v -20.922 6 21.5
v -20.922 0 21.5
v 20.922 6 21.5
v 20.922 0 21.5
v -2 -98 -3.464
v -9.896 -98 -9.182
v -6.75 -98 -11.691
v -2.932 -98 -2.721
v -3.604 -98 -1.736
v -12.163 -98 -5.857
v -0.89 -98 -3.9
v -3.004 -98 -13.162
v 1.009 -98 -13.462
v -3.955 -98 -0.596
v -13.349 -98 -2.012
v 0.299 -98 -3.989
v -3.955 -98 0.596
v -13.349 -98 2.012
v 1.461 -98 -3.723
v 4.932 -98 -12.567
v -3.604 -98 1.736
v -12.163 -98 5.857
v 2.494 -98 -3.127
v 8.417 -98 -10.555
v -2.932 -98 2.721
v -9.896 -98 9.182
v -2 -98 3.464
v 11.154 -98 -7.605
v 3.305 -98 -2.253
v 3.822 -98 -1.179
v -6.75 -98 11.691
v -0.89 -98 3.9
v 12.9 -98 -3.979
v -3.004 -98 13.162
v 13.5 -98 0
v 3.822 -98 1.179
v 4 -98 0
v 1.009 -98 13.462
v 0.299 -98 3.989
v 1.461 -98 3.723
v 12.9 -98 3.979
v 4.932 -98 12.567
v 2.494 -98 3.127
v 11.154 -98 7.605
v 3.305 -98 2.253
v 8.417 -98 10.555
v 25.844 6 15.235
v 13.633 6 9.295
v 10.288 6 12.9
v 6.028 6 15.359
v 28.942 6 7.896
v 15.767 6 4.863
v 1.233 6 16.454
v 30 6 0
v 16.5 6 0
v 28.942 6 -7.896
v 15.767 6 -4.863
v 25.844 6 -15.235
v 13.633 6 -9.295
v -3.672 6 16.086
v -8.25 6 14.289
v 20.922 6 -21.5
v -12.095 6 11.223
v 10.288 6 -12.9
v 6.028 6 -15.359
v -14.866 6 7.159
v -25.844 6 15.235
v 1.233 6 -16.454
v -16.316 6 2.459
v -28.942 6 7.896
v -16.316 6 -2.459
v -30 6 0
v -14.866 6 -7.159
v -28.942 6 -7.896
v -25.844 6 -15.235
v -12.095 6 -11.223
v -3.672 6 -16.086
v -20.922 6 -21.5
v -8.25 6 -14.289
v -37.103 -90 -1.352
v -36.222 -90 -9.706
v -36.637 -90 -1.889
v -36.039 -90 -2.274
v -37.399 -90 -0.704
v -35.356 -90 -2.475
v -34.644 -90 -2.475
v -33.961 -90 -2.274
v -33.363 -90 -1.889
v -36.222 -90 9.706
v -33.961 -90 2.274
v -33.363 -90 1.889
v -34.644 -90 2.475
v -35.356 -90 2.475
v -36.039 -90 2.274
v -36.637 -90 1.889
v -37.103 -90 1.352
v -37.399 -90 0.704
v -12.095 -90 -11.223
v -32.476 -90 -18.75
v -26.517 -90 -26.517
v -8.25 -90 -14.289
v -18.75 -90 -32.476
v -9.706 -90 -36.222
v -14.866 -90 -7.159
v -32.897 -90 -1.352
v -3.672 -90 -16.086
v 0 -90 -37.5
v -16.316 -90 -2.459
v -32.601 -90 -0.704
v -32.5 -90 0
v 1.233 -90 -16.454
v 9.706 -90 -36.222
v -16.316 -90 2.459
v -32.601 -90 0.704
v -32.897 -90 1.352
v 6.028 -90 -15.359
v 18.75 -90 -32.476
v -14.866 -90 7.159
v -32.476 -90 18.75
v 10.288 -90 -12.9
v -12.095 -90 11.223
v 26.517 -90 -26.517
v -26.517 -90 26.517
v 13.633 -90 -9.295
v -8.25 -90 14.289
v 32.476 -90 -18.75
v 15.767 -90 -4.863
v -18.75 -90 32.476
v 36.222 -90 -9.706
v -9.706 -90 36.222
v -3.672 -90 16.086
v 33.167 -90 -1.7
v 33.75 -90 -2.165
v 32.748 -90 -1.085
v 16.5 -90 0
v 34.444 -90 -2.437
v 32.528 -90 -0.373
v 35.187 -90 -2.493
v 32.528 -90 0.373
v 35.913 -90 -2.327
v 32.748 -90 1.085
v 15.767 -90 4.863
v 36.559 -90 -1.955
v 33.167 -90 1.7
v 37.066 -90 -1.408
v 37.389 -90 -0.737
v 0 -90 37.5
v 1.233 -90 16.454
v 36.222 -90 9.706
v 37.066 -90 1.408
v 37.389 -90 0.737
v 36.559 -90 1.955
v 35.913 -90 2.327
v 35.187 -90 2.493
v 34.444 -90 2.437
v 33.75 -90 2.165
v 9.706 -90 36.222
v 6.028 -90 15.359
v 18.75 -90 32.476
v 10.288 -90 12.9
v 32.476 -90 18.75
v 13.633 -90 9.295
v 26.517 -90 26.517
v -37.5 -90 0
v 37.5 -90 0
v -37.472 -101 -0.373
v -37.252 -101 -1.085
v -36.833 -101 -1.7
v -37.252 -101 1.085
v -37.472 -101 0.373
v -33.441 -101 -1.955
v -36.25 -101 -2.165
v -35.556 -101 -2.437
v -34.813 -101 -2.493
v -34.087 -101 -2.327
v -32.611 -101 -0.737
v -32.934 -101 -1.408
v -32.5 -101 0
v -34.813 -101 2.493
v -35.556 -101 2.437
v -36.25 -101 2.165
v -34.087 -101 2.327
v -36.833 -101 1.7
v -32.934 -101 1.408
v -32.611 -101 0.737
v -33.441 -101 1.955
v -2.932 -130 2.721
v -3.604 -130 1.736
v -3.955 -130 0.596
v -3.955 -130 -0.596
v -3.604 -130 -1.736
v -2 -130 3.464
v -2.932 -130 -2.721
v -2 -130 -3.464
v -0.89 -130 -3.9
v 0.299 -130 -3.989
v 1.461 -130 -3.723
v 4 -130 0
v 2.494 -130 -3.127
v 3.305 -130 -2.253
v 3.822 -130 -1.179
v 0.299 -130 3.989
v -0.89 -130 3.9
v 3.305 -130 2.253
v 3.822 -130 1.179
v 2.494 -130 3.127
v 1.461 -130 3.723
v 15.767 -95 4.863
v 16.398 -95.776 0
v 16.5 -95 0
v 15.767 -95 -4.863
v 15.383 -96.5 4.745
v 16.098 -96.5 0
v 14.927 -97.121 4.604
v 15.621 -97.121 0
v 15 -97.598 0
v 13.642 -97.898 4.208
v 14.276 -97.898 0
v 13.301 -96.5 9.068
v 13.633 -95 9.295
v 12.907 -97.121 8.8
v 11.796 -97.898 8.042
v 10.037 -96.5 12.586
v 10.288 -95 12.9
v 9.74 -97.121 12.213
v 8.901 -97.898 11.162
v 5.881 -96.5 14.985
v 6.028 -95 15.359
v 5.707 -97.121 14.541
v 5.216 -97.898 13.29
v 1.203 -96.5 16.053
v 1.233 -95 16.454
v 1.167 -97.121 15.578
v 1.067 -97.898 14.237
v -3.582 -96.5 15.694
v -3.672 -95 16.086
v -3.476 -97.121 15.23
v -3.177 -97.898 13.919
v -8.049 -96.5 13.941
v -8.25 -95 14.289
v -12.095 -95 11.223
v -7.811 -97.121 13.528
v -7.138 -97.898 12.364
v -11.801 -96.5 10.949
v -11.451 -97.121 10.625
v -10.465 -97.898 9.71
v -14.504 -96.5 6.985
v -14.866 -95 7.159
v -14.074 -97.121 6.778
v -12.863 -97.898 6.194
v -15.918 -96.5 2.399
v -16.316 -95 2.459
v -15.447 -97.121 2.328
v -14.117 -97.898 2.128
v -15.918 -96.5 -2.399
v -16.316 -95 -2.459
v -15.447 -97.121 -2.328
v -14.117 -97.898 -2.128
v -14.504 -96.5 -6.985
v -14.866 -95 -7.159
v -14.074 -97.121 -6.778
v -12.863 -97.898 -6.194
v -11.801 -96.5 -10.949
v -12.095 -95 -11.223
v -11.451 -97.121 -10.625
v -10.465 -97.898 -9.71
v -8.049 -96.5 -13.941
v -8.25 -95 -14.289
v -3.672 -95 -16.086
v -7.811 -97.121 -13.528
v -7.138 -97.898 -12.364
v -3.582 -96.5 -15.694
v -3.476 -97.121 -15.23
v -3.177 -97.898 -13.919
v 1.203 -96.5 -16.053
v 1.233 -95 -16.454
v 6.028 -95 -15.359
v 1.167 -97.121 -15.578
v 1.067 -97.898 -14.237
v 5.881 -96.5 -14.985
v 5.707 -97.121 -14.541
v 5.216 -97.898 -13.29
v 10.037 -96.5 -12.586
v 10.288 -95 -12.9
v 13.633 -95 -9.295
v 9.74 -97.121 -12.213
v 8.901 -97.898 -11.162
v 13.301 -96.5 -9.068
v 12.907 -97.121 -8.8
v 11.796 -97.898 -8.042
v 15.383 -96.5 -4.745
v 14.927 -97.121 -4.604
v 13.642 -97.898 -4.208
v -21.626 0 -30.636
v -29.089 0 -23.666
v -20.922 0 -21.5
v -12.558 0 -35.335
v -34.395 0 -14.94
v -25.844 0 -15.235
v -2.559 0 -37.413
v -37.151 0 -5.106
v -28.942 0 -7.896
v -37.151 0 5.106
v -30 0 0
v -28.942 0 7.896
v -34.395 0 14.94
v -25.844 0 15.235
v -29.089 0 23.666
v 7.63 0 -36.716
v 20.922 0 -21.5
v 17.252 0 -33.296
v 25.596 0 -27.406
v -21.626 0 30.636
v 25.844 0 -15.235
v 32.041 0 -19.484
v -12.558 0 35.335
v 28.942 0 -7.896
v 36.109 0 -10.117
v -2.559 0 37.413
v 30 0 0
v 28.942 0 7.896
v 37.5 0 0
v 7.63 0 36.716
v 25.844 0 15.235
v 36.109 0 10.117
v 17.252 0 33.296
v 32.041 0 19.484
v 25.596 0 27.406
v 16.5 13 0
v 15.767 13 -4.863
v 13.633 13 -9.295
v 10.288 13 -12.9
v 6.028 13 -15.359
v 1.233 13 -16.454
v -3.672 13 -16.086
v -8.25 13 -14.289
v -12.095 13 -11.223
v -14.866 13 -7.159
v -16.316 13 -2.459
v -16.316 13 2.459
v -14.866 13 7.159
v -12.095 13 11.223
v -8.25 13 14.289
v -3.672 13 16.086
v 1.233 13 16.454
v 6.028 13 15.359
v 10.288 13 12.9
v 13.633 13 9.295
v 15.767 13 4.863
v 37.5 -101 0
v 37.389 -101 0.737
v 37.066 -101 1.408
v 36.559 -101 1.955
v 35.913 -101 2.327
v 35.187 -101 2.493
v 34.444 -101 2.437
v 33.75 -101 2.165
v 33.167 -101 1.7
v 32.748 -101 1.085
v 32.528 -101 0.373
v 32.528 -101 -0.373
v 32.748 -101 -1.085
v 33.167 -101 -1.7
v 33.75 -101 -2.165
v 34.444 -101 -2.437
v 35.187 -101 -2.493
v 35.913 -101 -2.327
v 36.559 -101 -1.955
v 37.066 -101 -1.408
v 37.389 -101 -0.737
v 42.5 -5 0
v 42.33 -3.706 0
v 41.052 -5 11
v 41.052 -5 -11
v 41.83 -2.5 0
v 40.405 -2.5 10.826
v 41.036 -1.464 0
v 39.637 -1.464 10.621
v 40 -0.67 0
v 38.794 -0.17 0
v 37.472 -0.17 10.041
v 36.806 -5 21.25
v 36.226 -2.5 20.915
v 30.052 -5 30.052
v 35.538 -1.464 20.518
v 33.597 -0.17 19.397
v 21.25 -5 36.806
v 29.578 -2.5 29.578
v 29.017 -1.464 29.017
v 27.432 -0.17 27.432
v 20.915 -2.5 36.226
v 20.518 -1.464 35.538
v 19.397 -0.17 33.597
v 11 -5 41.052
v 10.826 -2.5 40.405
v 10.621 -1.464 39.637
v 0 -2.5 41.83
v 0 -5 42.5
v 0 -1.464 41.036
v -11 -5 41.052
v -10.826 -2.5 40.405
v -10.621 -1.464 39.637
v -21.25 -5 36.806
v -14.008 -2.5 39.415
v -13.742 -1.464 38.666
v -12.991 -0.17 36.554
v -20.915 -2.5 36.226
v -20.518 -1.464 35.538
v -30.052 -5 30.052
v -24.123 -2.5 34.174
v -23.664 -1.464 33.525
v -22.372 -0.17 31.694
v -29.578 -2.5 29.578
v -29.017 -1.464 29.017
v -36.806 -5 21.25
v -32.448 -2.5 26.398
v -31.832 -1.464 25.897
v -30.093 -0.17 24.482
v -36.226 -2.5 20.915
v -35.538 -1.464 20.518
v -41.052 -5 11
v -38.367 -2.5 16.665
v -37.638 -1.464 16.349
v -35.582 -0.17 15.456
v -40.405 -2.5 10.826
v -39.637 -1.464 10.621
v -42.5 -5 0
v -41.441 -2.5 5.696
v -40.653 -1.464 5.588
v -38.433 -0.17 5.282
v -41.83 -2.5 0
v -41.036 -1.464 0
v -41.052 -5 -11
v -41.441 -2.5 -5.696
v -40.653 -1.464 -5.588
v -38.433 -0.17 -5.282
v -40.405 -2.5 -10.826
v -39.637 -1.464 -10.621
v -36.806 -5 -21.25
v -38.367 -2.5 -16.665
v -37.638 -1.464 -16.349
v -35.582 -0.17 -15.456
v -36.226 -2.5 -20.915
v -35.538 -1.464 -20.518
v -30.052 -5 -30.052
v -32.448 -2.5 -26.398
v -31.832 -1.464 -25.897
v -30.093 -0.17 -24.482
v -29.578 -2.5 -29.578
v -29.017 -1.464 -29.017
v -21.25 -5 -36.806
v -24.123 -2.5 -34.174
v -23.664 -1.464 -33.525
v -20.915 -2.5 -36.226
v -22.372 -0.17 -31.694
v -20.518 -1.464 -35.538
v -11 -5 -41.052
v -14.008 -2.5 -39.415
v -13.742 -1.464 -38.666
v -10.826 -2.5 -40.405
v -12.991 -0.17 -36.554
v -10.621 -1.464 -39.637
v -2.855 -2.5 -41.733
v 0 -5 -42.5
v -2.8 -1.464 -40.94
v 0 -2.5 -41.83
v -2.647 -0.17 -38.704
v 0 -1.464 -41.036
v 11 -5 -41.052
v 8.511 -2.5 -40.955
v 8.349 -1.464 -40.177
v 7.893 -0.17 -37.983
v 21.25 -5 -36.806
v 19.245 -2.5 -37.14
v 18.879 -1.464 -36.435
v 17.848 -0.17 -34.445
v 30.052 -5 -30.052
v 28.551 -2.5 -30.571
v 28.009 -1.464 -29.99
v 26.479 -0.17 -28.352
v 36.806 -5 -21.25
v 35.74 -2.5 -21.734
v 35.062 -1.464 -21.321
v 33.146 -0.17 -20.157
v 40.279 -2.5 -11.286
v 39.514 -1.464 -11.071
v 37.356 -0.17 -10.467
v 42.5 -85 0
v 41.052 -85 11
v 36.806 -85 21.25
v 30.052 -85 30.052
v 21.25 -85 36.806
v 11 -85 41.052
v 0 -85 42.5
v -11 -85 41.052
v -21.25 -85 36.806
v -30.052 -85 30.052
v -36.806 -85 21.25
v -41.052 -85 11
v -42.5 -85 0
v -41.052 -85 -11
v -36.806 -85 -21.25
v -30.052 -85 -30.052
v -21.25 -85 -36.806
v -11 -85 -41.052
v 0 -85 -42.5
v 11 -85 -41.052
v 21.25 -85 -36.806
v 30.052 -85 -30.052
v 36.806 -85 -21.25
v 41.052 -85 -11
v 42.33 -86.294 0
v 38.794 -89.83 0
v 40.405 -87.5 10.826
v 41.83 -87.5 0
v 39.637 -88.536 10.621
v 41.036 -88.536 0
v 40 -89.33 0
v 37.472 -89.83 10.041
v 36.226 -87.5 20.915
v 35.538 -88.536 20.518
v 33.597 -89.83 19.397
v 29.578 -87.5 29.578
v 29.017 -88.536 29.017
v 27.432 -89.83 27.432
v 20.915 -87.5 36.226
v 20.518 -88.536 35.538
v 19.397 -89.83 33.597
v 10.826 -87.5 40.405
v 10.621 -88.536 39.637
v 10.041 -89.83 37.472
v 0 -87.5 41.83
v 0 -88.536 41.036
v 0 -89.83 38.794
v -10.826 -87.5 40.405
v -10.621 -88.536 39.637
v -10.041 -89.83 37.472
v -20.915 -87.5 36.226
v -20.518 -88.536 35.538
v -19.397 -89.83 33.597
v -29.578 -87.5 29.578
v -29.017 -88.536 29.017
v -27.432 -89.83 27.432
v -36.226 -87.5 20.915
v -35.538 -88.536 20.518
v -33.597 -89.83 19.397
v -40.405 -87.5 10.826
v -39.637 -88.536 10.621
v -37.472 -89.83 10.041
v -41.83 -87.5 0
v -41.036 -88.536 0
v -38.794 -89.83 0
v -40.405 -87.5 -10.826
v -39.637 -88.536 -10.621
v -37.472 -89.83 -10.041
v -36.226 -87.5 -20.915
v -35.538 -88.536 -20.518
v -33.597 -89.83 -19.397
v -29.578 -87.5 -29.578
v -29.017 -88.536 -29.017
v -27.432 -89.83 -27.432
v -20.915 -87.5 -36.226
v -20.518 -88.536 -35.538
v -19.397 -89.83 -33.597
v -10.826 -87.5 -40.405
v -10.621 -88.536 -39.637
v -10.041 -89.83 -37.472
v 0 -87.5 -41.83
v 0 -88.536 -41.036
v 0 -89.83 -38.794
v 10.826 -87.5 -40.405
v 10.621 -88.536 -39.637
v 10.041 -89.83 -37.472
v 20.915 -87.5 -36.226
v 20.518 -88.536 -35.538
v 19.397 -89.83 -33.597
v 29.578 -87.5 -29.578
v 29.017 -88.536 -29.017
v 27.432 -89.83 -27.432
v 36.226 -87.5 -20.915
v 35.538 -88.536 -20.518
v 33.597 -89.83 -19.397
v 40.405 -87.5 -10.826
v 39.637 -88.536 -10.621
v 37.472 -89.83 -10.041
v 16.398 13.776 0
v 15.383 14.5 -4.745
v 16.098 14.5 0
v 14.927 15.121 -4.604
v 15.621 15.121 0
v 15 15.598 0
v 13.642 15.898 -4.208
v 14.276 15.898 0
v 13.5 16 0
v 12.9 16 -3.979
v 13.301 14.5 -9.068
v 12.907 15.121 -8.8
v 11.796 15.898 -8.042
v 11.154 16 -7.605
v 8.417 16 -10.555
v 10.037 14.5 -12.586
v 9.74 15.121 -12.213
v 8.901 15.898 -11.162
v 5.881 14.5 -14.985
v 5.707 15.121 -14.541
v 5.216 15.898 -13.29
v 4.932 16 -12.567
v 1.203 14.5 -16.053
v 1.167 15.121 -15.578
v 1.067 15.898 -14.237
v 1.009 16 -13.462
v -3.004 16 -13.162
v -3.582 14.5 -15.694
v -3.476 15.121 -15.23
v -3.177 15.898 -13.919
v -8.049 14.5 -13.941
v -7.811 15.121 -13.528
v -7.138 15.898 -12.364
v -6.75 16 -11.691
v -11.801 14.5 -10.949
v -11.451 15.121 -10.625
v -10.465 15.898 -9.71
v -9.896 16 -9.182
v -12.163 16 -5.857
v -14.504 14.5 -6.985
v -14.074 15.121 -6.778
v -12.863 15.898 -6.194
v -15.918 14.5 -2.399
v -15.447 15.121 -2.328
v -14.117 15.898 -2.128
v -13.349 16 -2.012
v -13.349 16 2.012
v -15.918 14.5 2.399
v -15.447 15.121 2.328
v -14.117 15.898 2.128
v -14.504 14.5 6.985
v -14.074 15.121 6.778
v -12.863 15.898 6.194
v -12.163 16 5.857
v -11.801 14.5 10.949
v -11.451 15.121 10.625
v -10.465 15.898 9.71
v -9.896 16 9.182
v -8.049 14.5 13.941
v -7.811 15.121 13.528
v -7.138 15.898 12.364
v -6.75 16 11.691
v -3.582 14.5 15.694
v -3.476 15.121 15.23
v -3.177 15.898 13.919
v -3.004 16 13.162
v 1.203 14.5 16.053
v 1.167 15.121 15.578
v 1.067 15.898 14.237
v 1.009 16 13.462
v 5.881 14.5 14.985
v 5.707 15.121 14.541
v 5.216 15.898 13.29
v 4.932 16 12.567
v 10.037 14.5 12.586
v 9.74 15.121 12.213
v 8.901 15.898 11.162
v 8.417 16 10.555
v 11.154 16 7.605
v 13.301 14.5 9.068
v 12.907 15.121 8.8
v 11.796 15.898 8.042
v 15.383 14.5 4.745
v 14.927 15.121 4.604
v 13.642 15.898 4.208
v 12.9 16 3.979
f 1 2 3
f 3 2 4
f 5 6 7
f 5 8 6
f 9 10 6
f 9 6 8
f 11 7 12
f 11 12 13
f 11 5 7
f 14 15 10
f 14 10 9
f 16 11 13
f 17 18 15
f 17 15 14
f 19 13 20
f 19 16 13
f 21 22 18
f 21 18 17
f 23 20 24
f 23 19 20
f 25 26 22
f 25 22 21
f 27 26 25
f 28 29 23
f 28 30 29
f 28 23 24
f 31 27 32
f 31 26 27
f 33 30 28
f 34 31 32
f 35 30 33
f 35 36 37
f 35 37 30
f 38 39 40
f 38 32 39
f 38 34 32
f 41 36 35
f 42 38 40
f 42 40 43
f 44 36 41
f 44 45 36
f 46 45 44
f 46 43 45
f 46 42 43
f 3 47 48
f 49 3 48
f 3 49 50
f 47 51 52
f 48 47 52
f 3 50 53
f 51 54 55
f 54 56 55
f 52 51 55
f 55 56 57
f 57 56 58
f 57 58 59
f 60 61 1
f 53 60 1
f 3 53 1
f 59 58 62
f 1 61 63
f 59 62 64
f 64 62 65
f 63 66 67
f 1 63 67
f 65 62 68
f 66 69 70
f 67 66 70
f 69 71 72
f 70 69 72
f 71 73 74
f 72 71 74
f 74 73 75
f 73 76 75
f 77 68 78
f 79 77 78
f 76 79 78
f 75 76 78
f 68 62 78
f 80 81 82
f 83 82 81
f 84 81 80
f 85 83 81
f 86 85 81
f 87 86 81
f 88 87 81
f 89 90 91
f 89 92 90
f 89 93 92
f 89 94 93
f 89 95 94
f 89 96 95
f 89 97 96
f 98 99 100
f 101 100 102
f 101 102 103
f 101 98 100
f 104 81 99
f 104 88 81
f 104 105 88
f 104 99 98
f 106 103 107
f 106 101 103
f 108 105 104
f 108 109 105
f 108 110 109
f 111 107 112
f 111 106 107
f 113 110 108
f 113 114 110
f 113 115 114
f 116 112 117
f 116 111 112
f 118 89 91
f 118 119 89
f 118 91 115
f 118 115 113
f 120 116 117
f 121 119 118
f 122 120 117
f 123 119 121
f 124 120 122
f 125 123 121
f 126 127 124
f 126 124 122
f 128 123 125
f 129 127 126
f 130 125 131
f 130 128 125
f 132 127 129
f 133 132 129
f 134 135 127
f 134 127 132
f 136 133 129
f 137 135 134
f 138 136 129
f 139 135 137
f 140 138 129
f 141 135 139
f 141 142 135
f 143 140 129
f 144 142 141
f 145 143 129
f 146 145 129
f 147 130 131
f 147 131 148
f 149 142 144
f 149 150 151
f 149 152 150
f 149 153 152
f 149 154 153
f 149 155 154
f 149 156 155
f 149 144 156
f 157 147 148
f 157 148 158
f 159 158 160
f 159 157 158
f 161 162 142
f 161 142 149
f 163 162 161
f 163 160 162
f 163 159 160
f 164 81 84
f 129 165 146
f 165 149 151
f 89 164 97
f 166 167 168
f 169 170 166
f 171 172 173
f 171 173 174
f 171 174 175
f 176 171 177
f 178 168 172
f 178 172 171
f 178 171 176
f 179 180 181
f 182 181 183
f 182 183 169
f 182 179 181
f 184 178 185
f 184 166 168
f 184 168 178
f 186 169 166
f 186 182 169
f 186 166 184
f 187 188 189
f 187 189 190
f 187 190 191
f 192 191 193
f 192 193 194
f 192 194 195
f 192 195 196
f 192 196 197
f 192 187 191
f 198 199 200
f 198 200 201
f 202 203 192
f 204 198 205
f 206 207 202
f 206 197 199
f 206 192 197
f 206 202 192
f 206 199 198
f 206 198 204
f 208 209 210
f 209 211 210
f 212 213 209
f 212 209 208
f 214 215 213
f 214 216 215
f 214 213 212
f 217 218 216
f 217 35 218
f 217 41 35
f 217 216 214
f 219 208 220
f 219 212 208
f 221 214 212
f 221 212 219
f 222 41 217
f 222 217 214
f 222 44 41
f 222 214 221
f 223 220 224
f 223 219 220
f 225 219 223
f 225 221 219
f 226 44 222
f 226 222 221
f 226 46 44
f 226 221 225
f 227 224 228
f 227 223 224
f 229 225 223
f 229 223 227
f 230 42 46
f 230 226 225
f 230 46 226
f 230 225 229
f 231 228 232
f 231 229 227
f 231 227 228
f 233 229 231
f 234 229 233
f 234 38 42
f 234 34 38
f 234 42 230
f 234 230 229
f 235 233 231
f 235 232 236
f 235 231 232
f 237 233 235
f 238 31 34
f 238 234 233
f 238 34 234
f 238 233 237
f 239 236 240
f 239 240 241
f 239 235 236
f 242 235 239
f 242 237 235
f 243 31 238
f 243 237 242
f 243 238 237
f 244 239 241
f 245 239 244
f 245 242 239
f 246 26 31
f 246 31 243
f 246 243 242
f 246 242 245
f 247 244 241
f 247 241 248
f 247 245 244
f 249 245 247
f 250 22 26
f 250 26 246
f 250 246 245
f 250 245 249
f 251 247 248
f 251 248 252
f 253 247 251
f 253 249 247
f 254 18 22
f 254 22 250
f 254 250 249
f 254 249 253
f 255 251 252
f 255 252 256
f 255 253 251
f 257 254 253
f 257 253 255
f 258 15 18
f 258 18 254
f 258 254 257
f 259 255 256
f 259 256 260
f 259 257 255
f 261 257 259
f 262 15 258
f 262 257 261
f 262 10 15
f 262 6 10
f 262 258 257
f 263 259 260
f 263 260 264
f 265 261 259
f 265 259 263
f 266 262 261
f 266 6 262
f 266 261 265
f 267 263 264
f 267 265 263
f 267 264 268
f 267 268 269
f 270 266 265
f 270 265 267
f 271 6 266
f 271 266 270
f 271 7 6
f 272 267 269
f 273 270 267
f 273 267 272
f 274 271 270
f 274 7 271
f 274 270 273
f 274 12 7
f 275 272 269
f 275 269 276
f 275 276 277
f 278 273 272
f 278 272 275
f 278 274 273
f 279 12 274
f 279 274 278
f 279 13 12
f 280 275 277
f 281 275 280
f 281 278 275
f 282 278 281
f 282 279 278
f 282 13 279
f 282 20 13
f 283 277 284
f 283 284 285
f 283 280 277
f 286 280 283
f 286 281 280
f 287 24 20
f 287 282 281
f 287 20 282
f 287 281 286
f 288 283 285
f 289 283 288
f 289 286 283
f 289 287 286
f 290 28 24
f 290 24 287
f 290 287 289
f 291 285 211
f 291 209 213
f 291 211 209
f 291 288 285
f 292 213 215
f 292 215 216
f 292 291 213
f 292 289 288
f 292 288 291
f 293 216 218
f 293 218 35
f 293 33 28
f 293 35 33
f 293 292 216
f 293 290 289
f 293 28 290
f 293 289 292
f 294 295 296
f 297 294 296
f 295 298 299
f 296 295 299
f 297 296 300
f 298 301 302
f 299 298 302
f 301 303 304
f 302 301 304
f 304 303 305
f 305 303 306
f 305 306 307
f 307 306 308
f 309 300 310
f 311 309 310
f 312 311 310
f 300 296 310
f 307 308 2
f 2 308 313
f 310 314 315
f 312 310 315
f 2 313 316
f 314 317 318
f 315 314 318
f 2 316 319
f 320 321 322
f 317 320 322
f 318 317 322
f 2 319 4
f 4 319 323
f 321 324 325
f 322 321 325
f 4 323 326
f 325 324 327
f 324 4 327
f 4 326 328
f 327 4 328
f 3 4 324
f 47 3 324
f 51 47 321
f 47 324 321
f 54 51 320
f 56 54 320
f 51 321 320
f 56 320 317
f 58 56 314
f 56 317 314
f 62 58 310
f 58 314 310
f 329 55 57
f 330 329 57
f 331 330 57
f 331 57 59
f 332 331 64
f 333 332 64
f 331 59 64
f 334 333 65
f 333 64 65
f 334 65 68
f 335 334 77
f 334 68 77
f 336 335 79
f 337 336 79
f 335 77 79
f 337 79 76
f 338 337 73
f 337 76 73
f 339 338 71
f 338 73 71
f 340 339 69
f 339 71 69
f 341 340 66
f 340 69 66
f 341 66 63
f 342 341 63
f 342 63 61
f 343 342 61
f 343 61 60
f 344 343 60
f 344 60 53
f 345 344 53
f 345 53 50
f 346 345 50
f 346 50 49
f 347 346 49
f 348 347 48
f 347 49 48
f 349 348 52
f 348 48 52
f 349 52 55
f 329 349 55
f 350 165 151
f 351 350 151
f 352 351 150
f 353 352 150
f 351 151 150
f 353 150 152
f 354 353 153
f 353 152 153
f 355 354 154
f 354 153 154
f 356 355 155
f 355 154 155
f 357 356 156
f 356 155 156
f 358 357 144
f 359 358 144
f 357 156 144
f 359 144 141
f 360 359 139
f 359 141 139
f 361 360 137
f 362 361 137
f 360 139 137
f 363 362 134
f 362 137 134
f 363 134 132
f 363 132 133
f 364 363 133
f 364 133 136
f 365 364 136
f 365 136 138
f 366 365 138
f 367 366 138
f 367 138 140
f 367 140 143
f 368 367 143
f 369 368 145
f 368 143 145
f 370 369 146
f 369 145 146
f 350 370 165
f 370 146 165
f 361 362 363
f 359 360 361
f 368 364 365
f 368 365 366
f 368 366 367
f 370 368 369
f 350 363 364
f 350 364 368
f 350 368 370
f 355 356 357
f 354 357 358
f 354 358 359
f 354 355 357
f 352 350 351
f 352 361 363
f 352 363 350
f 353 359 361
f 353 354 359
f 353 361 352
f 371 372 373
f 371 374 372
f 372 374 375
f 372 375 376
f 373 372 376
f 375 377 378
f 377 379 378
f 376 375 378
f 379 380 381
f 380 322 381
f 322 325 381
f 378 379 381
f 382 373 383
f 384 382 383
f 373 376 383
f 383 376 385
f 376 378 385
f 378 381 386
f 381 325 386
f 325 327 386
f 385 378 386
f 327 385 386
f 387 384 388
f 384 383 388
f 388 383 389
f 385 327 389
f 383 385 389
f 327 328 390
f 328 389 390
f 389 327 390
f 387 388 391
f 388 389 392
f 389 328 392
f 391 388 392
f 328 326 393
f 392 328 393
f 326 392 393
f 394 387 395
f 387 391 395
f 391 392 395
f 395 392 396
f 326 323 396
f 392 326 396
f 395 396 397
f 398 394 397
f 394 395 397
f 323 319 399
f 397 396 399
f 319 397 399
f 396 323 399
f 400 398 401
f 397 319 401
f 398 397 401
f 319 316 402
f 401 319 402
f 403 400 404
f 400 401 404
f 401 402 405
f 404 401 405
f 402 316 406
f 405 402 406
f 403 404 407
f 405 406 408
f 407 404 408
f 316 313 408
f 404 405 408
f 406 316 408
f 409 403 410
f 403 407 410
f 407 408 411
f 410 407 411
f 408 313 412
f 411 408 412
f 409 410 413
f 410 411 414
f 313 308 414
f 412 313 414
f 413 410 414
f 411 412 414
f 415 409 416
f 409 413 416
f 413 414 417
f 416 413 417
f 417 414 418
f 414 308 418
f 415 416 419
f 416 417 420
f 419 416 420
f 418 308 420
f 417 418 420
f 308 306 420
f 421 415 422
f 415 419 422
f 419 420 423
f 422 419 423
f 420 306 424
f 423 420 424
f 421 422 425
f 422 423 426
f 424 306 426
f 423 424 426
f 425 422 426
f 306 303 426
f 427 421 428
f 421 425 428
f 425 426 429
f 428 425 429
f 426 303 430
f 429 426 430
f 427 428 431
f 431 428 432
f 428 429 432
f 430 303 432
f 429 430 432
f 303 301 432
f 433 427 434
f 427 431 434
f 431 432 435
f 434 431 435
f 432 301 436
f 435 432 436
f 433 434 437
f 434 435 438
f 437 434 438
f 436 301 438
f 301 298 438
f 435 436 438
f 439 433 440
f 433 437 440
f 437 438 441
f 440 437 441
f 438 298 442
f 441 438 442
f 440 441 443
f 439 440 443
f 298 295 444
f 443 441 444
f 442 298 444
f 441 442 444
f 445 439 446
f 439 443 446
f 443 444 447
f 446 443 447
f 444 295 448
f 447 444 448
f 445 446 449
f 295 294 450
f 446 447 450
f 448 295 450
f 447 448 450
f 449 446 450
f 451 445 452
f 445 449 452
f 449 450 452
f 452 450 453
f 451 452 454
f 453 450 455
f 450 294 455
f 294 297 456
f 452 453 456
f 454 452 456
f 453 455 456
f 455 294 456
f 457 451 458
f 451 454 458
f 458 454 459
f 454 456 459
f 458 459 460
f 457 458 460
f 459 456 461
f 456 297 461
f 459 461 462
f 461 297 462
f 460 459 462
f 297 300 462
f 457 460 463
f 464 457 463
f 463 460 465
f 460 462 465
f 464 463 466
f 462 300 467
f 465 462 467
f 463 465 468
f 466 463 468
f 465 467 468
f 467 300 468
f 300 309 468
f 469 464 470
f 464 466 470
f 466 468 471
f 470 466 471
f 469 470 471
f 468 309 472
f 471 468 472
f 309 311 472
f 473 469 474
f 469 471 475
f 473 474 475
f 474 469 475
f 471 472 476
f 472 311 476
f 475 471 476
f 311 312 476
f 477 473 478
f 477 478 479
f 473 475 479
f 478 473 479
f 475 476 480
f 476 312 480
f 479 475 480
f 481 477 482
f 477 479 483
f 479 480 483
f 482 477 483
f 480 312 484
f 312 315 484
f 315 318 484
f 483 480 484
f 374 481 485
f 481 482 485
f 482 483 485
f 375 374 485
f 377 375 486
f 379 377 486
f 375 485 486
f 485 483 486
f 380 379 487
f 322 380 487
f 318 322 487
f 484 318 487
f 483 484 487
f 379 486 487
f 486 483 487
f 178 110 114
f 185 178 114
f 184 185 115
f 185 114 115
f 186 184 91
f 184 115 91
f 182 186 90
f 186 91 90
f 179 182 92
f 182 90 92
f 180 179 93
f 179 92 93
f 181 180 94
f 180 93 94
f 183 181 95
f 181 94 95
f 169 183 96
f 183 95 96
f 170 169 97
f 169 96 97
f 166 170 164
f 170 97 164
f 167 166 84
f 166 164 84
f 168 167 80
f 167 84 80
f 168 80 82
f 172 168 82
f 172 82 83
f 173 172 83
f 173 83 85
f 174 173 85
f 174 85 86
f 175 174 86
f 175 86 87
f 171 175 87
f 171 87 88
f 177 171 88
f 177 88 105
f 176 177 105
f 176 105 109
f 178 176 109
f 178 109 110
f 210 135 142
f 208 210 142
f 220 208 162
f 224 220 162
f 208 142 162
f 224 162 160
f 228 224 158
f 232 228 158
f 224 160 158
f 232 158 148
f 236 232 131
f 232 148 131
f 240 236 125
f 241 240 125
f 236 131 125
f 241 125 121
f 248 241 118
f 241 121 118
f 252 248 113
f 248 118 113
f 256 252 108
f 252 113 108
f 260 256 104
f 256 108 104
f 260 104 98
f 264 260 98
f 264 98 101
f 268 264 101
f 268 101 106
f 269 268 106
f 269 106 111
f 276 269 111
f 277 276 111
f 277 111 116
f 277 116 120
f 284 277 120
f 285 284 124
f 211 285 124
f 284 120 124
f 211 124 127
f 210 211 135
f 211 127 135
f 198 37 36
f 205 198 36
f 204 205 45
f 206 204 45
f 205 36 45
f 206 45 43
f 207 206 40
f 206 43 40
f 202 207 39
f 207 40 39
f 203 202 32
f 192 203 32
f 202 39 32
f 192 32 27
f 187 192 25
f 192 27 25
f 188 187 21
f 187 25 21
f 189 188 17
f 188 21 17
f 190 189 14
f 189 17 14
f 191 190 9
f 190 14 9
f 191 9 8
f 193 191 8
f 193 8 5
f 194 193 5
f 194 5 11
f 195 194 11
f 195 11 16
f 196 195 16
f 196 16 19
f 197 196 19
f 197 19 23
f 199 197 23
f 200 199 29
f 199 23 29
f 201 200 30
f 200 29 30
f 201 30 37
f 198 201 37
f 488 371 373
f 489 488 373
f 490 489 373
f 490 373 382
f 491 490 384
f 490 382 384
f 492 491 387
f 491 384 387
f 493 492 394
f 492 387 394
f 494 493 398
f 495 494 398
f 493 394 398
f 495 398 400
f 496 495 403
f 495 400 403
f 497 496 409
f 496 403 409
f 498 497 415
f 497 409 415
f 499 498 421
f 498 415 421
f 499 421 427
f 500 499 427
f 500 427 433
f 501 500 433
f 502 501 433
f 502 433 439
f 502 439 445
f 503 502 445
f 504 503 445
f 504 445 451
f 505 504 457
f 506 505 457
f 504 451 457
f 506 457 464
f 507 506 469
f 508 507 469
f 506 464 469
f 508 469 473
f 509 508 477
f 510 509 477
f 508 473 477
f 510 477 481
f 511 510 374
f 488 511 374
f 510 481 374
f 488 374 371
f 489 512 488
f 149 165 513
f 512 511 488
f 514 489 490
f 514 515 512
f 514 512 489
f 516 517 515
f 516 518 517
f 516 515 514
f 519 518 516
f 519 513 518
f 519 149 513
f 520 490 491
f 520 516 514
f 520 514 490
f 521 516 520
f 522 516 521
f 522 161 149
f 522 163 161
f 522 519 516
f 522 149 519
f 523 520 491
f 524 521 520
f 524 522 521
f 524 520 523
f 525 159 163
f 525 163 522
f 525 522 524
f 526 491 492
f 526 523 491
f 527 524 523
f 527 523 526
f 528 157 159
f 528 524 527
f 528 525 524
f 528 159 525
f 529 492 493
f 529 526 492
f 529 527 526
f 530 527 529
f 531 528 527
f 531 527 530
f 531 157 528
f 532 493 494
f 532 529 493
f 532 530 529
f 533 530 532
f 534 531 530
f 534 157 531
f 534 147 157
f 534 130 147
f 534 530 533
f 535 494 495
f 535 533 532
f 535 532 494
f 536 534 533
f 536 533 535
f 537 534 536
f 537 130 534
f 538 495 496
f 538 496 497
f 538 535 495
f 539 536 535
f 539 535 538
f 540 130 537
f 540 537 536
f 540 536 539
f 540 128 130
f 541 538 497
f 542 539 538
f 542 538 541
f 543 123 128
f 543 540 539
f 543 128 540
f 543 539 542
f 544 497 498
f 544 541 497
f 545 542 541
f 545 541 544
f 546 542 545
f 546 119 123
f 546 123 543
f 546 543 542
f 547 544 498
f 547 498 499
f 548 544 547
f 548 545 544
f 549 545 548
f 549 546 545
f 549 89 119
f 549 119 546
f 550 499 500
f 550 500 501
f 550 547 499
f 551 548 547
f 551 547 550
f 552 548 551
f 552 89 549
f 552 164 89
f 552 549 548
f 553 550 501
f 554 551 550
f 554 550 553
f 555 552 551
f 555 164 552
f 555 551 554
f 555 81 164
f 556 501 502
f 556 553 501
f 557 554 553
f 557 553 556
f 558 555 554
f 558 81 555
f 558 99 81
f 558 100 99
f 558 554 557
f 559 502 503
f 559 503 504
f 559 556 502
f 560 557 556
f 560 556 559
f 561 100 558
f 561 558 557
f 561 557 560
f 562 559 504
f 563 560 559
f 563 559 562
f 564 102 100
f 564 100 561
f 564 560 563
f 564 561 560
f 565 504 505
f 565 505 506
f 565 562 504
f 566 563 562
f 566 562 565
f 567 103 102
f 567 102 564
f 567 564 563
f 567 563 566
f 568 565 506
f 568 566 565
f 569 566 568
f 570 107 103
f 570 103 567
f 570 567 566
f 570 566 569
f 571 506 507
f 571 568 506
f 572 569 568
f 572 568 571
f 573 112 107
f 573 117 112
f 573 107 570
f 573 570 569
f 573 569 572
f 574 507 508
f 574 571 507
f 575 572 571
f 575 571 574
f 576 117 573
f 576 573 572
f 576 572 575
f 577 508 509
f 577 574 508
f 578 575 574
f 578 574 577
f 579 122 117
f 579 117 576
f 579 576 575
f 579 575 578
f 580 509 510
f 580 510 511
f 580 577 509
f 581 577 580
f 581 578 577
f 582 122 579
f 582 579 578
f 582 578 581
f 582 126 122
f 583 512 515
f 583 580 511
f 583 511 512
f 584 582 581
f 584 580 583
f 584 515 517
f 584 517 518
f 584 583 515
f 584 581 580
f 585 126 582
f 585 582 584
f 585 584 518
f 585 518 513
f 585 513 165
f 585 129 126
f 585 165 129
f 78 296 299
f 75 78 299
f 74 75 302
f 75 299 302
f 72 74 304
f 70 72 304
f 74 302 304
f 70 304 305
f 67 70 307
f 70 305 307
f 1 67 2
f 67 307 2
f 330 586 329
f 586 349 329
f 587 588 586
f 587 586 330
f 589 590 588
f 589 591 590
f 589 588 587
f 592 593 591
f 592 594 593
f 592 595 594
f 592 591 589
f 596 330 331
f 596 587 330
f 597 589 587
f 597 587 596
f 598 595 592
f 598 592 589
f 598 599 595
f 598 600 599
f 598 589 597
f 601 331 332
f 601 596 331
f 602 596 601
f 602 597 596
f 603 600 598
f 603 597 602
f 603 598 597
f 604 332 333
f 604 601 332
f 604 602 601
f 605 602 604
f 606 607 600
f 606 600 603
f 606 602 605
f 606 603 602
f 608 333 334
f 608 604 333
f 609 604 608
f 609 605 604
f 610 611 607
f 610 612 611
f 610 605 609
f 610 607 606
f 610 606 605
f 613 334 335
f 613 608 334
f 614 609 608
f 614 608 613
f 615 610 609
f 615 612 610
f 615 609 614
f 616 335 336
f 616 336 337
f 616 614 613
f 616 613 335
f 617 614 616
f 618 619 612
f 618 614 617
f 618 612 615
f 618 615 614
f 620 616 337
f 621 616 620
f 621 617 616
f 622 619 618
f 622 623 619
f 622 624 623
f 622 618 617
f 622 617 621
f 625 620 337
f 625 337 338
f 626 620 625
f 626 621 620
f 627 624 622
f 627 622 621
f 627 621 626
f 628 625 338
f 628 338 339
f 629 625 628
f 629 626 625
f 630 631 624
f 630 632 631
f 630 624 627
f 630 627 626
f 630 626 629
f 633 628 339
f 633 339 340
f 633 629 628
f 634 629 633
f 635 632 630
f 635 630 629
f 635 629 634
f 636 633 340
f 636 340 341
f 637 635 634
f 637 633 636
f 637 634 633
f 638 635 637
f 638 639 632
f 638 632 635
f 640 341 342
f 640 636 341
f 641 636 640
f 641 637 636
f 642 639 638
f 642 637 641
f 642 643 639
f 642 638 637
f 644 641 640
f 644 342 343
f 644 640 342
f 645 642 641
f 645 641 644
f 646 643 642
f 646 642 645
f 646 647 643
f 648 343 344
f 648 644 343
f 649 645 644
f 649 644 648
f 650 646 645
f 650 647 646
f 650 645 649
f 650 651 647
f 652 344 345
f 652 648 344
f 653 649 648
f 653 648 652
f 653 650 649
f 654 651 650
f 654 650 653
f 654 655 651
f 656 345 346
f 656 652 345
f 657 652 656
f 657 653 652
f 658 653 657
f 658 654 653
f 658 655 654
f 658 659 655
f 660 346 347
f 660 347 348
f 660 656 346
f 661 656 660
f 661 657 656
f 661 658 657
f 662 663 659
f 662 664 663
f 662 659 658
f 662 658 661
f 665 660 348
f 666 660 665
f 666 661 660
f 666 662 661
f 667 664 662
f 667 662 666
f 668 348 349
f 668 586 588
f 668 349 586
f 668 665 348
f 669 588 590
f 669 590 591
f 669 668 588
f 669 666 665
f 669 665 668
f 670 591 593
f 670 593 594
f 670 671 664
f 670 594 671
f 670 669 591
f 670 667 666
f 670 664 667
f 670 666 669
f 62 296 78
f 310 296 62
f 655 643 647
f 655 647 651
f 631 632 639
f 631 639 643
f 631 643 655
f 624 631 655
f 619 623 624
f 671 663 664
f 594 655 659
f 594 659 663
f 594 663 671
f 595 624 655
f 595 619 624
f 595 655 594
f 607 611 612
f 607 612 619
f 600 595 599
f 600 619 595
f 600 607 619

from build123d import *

# Parameters (mm, degrees)
SKETCH_R     = 42.5
PAD_DEPTH    = 90
FILLET_R     = 5
FILLET001_R  = 5
SKETCH001_R  = 16.5
PAD001_DEPTH = 8
FILLET002_R  = 3
SKETCH002_R  = 4
PAD002_DEPTH = 32
PAD003_DEPTH = 6
SKETCH004_R  = 16.5
PAD004_DEPTH = 10
FILLET003_R  = 3
SKETCH005_R  = 2.5
PAD005_DEPTH = 11


with BuildPart() as part:
    # Sketch → Pad (new body)
    with BuildSketch(Plane.XZ):
        Circle(SKETCH_R)
    extrude(amount=PAD_DEPTH)

    # Fillet
    fillet_edges = [part.edges().sort_by_distance(p)[0] for p in [
        (-42.5, -90, 0),
    ]]
    fillet(fillet_edges, radius=FILLET_R)

    # Fillet001
    fillet001_edges = [part.edges().sort_by_distance(p)[0] for p in [
        (-42.5, 0, 0),
    ]]
    fillet(fillet001_edges, radius=FILLET001_R)

    # Sketch001 (on Face5 of Fillet001) → Pad001 (join)
    with BuildSketch(Plane.XZ.offset(90)):
        Circle(SKETCH001_R)
    extrude(amount=PAD001_DEPTH)

    # Fillet002
    fillet002_edges = [part.edges().sort_by_distance(p)[0] for p in [
        (-16.5, -98, 0),
    ]]
    fillet(fillet002_edges, radius=FILLET002_R)

    # Sketch002 (on Face4 of Fillet002) → Pad002 (join)
    with BuildSketch(Plane.XZ.offset(98)):
        Circle(SKETCH002_R)
    extrude(amount=PAD002_DEPTH)

    # Sketch003 (on Face10 of Pad002) → Pad003 (join)
    with BuildSketch(Plane(origin=(0, 0, 0), x_dir=(1, 0, 0), z_dir=(0, 1, 0))):
        with BuildLine():
            Line((-20.922476, 21.5), (20.922476, 21.5))
            ThreePointArc((20.922476, -21.5), (30, 0), (20.922476, 21.5))
            Line((-20.922476, -21.5), (20.922476, -21.5))
            ThreePointArc((-20.922476, 21.5), (-30, 0), (-20.922476, -21.5))
        make_face()
    extrude(amount=PAD003_DEPTH)

    # Sketch004 (on Face15 of Pad003) → Pad004 (join)
    with BuildSketch(Plane(origin=(0, 6, 0), x_dir=(1, 0, 0), z_dir=(0, 1, 0))):
        Circle(SKETCH004_R)
    extrude(amount=PAD004_DEPTH)

    # Fillet003
    fillet003_edges = [part.edges().sort_by_distance(p)[0] for p in [
        (-16.5, 16, 0),
    ]]
    fillet(fillet003_edges, radius=FILLET003_R)

    # Sketch005 (on Face13 of Fillet003) → Pad005 (join)
    with BuildSketch(Plane.XZ.offset(90)):
        with Locations((-35, 0)):
            Circle(SKETCH005_R)
        with Locations((35, 0)):
            Circle(SKETCH005_R)
    extrude(amount=PAD005_DEPTH)


solid = part.part
